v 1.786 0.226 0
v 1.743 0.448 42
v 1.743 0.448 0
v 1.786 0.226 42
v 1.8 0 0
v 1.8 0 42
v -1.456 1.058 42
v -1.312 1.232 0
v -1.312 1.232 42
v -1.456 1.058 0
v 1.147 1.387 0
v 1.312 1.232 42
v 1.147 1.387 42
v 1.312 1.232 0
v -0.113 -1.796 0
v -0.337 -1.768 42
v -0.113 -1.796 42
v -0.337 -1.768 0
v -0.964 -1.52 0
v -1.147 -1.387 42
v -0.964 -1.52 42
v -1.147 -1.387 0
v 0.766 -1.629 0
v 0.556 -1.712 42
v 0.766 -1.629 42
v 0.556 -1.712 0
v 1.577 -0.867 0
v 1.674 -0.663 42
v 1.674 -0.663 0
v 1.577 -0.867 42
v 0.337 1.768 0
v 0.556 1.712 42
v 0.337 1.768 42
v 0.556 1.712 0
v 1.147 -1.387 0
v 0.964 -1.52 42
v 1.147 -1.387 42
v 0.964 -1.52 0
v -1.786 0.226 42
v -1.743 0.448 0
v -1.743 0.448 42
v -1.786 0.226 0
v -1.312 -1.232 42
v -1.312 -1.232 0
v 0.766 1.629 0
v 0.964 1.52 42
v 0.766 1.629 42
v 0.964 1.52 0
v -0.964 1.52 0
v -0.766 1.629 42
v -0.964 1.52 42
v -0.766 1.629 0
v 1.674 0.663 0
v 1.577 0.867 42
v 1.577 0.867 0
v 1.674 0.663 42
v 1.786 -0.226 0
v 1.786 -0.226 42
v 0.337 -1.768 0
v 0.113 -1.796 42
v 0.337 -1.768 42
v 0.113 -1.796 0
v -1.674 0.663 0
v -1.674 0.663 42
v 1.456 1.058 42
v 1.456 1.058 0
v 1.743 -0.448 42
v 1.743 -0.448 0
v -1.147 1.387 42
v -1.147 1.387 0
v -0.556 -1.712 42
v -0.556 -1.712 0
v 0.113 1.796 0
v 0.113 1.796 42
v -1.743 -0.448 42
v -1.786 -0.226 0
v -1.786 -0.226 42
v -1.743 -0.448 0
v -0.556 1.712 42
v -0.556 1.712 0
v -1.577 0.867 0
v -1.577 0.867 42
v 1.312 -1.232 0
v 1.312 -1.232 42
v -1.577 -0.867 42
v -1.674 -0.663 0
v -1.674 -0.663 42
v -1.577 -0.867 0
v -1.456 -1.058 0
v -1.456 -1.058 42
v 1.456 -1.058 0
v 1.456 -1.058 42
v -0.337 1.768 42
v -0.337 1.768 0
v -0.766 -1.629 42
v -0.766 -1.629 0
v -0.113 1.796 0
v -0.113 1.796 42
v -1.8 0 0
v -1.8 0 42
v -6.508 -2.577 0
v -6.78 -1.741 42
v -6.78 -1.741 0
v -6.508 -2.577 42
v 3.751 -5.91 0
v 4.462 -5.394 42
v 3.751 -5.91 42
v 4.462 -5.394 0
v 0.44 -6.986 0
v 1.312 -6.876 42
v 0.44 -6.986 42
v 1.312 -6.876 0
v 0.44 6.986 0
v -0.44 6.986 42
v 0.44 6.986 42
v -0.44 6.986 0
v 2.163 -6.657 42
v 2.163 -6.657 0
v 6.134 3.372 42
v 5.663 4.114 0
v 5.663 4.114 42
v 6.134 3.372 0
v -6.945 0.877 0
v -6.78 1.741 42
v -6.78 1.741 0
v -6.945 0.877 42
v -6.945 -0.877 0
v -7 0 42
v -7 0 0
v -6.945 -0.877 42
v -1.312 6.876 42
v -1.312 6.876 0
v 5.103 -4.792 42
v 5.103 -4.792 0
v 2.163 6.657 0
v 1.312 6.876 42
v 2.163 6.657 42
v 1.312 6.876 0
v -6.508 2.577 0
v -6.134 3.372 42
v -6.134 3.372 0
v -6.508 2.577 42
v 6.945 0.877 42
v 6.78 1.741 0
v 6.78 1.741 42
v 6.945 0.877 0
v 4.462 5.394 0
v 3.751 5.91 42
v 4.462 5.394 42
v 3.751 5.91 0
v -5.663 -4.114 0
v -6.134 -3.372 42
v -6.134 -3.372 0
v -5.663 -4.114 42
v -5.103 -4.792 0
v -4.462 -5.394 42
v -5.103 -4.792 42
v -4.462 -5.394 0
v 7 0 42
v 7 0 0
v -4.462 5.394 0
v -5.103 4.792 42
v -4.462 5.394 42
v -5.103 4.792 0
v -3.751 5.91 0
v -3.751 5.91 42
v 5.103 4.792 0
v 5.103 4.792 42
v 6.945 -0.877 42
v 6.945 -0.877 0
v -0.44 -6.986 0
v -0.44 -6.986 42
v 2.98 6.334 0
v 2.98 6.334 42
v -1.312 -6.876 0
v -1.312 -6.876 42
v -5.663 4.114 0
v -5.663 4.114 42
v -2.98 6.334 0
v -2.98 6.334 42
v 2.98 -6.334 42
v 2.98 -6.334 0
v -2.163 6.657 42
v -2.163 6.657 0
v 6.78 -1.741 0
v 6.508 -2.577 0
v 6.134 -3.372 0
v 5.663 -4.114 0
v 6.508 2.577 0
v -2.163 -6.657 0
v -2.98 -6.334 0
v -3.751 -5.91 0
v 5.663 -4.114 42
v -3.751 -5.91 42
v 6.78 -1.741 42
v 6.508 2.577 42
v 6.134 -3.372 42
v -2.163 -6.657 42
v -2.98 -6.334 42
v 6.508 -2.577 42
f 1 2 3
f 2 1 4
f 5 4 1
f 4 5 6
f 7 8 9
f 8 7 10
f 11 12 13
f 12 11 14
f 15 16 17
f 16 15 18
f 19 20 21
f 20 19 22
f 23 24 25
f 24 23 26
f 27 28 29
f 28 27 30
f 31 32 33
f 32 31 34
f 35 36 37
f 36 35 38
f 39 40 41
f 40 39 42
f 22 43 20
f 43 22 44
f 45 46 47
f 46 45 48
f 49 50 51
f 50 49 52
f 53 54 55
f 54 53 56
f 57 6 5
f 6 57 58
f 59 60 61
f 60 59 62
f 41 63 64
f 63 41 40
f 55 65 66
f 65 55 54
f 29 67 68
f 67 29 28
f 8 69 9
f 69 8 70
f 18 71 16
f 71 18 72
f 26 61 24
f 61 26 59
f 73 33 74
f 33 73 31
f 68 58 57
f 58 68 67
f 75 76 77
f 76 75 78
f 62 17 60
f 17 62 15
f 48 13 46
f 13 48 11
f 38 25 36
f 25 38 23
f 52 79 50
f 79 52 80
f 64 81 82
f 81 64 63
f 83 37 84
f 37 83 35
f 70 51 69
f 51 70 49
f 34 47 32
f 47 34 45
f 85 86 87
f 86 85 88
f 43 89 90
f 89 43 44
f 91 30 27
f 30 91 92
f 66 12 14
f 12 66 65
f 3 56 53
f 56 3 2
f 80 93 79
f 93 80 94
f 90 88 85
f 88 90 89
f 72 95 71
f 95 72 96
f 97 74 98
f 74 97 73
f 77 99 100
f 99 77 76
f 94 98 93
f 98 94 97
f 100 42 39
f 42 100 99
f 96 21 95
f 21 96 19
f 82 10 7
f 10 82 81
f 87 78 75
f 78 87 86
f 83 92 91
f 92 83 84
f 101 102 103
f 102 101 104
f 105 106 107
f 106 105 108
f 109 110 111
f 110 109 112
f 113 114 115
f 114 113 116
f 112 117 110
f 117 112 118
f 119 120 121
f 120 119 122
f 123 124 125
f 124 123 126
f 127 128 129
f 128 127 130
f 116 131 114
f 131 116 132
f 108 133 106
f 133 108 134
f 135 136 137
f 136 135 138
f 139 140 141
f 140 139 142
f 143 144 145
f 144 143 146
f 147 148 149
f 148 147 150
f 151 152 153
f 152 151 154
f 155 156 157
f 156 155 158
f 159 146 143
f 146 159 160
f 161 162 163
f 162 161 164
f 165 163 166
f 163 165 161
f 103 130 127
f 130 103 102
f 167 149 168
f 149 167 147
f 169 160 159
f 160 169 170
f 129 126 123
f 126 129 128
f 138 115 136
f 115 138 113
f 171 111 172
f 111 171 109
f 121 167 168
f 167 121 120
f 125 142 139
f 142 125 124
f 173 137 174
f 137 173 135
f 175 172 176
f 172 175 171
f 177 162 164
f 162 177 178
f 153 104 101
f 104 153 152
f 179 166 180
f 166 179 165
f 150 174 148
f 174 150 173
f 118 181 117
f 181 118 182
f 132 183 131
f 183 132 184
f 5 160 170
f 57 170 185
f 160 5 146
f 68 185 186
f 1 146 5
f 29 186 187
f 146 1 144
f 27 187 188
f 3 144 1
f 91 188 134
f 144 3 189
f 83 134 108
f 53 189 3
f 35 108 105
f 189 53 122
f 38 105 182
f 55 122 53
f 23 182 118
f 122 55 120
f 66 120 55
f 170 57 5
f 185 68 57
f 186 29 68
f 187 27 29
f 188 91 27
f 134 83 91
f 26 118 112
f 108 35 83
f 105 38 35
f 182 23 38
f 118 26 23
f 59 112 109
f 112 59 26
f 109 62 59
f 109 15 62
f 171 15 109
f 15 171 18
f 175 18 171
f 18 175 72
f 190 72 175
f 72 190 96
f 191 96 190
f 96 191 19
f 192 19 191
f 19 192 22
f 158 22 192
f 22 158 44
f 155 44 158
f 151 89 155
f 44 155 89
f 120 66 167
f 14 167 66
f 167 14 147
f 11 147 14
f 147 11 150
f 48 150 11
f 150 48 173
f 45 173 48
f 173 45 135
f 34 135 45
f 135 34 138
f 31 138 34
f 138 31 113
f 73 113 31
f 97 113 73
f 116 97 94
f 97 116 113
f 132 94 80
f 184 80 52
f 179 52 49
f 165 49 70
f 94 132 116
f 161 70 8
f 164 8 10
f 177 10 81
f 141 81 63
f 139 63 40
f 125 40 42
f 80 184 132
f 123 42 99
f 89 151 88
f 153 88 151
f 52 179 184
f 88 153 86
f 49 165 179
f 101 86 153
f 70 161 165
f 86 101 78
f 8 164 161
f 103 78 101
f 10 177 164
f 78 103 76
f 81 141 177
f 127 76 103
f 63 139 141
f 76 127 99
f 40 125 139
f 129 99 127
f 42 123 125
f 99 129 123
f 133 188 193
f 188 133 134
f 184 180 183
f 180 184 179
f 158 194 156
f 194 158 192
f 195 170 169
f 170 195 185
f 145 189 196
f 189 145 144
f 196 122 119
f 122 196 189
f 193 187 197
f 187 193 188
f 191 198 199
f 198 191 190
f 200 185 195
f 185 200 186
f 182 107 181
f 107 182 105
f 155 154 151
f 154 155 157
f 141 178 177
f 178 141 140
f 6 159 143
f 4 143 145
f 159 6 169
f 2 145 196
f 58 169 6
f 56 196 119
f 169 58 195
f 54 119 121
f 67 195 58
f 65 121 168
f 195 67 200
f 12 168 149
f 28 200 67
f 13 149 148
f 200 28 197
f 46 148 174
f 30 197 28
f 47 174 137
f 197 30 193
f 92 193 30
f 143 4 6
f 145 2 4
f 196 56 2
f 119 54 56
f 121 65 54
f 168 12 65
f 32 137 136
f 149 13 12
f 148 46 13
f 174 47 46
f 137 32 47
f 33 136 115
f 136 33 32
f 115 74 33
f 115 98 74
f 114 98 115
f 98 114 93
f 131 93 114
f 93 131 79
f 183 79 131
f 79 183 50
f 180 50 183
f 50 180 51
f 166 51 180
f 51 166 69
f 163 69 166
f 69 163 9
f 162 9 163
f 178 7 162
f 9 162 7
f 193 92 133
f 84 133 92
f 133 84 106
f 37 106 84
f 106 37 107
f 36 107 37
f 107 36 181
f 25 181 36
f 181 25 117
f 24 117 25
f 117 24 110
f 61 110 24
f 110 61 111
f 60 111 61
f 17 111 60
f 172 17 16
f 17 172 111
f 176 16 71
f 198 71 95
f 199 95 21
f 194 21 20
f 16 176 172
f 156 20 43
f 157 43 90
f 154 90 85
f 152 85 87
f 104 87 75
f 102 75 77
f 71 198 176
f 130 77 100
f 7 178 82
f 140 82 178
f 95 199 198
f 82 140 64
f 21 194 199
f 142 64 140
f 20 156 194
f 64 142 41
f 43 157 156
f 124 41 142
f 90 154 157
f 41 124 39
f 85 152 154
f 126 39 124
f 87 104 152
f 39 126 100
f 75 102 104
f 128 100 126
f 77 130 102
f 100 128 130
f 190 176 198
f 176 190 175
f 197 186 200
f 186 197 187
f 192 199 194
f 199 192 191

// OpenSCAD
$fn = 50;


difference() {
	union() {
		cylinder(h = 42, r = 7.0000000000);
	}
	union() {
		translate(v = [0.0000000000, 0.0000000000, -100.0000000000]) {
			cylinder(h = 200, r = 1.8000000000);
		}
		cylinder(h = 42, r = 1.8000000000);
		cylinder(h = 42, r = 1.8000000000);
		cylinder(h = 42, r = 1.8000000000);
	}
}
